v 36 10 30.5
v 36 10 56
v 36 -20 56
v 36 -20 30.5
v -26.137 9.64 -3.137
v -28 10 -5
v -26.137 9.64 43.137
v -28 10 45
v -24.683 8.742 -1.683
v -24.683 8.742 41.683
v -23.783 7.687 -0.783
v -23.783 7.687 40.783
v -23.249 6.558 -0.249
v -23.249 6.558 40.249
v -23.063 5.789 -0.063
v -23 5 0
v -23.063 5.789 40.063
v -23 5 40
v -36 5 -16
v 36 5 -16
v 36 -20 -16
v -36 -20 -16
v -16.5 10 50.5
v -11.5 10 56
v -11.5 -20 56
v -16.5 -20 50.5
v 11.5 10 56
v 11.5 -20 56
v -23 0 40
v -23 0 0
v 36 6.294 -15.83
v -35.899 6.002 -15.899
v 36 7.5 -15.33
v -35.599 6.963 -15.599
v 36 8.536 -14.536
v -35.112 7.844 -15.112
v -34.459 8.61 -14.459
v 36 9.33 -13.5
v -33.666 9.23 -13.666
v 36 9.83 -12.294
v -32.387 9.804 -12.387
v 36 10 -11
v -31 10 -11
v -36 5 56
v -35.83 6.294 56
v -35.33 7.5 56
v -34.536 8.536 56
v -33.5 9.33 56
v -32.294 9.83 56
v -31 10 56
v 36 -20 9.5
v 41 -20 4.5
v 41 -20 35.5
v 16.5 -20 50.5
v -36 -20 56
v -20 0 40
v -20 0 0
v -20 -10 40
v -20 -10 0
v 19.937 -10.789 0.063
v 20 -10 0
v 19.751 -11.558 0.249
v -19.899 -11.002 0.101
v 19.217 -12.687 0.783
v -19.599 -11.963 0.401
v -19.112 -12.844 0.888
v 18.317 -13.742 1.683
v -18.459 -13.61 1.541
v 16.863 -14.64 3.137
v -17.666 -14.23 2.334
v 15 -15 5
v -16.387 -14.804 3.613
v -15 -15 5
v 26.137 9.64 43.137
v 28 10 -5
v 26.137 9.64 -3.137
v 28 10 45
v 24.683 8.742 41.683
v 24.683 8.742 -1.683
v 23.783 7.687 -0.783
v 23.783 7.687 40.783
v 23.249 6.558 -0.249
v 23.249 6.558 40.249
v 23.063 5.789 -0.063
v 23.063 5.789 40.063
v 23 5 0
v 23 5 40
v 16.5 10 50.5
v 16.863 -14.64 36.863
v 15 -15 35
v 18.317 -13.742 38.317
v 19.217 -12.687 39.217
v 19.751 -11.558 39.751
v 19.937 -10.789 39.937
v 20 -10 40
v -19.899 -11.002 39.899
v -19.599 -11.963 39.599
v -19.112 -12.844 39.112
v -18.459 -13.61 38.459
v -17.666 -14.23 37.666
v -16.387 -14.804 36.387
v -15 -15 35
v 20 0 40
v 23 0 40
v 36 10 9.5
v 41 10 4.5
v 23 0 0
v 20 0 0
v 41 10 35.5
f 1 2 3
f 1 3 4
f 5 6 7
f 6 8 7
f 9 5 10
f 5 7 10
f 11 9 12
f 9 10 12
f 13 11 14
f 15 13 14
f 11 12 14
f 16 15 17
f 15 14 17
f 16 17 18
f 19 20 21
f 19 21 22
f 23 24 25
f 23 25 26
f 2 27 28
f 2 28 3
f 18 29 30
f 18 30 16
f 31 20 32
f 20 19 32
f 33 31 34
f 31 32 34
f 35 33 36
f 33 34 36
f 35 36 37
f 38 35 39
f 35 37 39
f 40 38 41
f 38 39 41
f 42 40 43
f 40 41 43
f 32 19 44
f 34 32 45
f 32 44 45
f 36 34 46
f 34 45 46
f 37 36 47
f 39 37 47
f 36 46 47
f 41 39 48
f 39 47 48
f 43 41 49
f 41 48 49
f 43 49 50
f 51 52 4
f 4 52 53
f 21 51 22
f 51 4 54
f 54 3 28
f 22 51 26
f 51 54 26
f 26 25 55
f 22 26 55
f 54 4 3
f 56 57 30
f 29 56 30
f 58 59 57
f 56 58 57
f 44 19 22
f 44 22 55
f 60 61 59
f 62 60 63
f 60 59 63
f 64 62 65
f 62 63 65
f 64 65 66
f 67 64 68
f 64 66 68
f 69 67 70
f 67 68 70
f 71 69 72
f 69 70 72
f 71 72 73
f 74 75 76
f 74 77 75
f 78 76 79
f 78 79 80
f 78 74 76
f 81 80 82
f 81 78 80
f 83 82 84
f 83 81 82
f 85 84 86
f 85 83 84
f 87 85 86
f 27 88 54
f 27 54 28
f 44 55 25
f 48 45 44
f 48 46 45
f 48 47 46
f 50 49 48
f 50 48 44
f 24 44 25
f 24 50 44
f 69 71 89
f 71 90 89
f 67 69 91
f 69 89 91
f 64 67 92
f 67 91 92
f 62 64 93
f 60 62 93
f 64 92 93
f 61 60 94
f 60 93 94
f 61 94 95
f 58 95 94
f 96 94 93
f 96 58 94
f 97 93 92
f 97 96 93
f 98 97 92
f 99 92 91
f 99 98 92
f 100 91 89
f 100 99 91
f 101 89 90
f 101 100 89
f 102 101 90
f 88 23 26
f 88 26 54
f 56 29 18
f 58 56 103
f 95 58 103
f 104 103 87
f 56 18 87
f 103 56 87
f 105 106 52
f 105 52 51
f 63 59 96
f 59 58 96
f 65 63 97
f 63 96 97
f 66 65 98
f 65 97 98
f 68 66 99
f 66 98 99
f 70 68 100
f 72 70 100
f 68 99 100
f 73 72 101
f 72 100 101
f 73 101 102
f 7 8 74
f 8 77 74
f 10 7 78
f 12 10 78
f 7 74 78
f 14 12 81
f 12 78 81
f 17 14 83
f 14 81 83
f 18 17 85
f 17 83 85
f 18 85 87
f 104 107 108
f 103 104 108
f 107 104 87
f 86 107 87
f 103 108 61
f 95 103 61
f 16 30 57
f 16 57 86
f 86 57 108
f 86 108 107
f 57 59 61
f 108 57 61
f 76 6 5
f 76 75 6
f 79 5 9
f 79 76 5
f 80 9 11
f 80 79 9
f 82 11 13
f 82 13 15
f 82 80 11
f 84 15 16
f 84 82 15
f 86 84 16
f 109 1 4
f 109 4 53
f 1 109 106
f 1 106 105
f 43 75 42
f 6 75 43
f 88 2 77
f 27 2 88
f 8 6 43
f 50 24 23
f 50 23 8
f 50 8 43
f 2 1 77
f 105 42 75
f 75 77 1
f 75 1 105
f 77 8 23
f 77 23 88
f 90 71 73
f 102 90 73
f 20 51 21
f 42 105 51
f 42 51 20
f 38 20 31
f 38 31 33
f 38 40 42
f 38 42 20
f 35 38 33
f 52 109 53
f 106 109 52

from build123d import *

# Parameters (mm, degrees)
F0_W     = 2
F0_H     = 10
F1_DEPTH = 40
F2_W     = 50
F2_H     = 30
F3_DEPTH = 5
F4_W     = 50
F4_H     = 30
F5_DEPTH = 5
F6_W     = 50
F6_H     = 50
F7_DEPTH = 30
F8_R     = 5
F9_R     = 5


# Not quite as in the source:
# - a feature names something its author has since deleted; it is built from what else it names


with BuildPart() as f1:
    # F0 (on Top) → F1 (new body)
    with BuildSketch(Plane.XY):
        with Locations((-24, 5)):
            Rectangle(F0_W, F0_H)
        with Locations((24, 5)):
            Rectangle(F0_W, F0_H)
        Polygon((-25, 0), (-25, -20), (25, -20), (25, 0), (23, 0), (20, 0), (20, -15), (-20, -15), (-20, 0), (-23, 0), align=None)
    extrude(amount=F1_DEPTH)

    # F2 (on face) → F3 (join)
    with BuildSketch(Plane.XY.offset(40)):
        with Locations((0, -5)):
            Rectangle(F2_W, F2_H)
    extrude(amount=F3_DEPTH)

    # F4 (on face) → F5 (join)
    with BuildSketch(Plane(origin=(0, 0, 0), x_dir=(1, 0, 0), z_dir=(0, 0, -1))):
        with Locations((0, 5)):
            Rectangle(F4_W, F4_H)
    extrude(amount=F5_DEPTH)

    # F6 (on face) → F7 (join)
    with BuildSketch(Plane(origin=(0, 10, 0), x_dir=(-1, 0, 0), z_dir=(0, 1, 0))):
        Polygon((-36, 9.5), (-36, -16), (36, -16), (36, 56), (11.5, 56), (16.5, 50.5), (-16.5, 50.5), (-11.5, 56), (-36, 56), (-36, 30.5), align=None)
        with Locations((0, 20)):
            Rectangle(F6_W, F6_H, mode=Mode.SUBTRACT)
        Polygon((-41, 4.5), (-36, 9.5), (-36, 30.5), (-41, 35.5), align=None)
    extrude(amount=-F7_DEPTH)

    # F8
    f8_edges = [f1.edges().sort_by_distance(p)[0] for p in [
        (0, 10, 0),
        (23, 10, 20),
        (0, 10, 40),
        (-23, 10, 20),
        (-36, 10, 20),
        (0, 10, -16),
    ]]
    fillet(f8_edges, radius=F8_R)

    # F9
    f9_edges = [f1.edges().sort_by_distance(p)[0] for p in [
        (20, -15, 20),
        (0, -15, 0),
        (0, -15, 40),
        (-20, -15, 20),
    ]]
    fillet(f9_edges, radius=F9_R)


solid = f1.part
